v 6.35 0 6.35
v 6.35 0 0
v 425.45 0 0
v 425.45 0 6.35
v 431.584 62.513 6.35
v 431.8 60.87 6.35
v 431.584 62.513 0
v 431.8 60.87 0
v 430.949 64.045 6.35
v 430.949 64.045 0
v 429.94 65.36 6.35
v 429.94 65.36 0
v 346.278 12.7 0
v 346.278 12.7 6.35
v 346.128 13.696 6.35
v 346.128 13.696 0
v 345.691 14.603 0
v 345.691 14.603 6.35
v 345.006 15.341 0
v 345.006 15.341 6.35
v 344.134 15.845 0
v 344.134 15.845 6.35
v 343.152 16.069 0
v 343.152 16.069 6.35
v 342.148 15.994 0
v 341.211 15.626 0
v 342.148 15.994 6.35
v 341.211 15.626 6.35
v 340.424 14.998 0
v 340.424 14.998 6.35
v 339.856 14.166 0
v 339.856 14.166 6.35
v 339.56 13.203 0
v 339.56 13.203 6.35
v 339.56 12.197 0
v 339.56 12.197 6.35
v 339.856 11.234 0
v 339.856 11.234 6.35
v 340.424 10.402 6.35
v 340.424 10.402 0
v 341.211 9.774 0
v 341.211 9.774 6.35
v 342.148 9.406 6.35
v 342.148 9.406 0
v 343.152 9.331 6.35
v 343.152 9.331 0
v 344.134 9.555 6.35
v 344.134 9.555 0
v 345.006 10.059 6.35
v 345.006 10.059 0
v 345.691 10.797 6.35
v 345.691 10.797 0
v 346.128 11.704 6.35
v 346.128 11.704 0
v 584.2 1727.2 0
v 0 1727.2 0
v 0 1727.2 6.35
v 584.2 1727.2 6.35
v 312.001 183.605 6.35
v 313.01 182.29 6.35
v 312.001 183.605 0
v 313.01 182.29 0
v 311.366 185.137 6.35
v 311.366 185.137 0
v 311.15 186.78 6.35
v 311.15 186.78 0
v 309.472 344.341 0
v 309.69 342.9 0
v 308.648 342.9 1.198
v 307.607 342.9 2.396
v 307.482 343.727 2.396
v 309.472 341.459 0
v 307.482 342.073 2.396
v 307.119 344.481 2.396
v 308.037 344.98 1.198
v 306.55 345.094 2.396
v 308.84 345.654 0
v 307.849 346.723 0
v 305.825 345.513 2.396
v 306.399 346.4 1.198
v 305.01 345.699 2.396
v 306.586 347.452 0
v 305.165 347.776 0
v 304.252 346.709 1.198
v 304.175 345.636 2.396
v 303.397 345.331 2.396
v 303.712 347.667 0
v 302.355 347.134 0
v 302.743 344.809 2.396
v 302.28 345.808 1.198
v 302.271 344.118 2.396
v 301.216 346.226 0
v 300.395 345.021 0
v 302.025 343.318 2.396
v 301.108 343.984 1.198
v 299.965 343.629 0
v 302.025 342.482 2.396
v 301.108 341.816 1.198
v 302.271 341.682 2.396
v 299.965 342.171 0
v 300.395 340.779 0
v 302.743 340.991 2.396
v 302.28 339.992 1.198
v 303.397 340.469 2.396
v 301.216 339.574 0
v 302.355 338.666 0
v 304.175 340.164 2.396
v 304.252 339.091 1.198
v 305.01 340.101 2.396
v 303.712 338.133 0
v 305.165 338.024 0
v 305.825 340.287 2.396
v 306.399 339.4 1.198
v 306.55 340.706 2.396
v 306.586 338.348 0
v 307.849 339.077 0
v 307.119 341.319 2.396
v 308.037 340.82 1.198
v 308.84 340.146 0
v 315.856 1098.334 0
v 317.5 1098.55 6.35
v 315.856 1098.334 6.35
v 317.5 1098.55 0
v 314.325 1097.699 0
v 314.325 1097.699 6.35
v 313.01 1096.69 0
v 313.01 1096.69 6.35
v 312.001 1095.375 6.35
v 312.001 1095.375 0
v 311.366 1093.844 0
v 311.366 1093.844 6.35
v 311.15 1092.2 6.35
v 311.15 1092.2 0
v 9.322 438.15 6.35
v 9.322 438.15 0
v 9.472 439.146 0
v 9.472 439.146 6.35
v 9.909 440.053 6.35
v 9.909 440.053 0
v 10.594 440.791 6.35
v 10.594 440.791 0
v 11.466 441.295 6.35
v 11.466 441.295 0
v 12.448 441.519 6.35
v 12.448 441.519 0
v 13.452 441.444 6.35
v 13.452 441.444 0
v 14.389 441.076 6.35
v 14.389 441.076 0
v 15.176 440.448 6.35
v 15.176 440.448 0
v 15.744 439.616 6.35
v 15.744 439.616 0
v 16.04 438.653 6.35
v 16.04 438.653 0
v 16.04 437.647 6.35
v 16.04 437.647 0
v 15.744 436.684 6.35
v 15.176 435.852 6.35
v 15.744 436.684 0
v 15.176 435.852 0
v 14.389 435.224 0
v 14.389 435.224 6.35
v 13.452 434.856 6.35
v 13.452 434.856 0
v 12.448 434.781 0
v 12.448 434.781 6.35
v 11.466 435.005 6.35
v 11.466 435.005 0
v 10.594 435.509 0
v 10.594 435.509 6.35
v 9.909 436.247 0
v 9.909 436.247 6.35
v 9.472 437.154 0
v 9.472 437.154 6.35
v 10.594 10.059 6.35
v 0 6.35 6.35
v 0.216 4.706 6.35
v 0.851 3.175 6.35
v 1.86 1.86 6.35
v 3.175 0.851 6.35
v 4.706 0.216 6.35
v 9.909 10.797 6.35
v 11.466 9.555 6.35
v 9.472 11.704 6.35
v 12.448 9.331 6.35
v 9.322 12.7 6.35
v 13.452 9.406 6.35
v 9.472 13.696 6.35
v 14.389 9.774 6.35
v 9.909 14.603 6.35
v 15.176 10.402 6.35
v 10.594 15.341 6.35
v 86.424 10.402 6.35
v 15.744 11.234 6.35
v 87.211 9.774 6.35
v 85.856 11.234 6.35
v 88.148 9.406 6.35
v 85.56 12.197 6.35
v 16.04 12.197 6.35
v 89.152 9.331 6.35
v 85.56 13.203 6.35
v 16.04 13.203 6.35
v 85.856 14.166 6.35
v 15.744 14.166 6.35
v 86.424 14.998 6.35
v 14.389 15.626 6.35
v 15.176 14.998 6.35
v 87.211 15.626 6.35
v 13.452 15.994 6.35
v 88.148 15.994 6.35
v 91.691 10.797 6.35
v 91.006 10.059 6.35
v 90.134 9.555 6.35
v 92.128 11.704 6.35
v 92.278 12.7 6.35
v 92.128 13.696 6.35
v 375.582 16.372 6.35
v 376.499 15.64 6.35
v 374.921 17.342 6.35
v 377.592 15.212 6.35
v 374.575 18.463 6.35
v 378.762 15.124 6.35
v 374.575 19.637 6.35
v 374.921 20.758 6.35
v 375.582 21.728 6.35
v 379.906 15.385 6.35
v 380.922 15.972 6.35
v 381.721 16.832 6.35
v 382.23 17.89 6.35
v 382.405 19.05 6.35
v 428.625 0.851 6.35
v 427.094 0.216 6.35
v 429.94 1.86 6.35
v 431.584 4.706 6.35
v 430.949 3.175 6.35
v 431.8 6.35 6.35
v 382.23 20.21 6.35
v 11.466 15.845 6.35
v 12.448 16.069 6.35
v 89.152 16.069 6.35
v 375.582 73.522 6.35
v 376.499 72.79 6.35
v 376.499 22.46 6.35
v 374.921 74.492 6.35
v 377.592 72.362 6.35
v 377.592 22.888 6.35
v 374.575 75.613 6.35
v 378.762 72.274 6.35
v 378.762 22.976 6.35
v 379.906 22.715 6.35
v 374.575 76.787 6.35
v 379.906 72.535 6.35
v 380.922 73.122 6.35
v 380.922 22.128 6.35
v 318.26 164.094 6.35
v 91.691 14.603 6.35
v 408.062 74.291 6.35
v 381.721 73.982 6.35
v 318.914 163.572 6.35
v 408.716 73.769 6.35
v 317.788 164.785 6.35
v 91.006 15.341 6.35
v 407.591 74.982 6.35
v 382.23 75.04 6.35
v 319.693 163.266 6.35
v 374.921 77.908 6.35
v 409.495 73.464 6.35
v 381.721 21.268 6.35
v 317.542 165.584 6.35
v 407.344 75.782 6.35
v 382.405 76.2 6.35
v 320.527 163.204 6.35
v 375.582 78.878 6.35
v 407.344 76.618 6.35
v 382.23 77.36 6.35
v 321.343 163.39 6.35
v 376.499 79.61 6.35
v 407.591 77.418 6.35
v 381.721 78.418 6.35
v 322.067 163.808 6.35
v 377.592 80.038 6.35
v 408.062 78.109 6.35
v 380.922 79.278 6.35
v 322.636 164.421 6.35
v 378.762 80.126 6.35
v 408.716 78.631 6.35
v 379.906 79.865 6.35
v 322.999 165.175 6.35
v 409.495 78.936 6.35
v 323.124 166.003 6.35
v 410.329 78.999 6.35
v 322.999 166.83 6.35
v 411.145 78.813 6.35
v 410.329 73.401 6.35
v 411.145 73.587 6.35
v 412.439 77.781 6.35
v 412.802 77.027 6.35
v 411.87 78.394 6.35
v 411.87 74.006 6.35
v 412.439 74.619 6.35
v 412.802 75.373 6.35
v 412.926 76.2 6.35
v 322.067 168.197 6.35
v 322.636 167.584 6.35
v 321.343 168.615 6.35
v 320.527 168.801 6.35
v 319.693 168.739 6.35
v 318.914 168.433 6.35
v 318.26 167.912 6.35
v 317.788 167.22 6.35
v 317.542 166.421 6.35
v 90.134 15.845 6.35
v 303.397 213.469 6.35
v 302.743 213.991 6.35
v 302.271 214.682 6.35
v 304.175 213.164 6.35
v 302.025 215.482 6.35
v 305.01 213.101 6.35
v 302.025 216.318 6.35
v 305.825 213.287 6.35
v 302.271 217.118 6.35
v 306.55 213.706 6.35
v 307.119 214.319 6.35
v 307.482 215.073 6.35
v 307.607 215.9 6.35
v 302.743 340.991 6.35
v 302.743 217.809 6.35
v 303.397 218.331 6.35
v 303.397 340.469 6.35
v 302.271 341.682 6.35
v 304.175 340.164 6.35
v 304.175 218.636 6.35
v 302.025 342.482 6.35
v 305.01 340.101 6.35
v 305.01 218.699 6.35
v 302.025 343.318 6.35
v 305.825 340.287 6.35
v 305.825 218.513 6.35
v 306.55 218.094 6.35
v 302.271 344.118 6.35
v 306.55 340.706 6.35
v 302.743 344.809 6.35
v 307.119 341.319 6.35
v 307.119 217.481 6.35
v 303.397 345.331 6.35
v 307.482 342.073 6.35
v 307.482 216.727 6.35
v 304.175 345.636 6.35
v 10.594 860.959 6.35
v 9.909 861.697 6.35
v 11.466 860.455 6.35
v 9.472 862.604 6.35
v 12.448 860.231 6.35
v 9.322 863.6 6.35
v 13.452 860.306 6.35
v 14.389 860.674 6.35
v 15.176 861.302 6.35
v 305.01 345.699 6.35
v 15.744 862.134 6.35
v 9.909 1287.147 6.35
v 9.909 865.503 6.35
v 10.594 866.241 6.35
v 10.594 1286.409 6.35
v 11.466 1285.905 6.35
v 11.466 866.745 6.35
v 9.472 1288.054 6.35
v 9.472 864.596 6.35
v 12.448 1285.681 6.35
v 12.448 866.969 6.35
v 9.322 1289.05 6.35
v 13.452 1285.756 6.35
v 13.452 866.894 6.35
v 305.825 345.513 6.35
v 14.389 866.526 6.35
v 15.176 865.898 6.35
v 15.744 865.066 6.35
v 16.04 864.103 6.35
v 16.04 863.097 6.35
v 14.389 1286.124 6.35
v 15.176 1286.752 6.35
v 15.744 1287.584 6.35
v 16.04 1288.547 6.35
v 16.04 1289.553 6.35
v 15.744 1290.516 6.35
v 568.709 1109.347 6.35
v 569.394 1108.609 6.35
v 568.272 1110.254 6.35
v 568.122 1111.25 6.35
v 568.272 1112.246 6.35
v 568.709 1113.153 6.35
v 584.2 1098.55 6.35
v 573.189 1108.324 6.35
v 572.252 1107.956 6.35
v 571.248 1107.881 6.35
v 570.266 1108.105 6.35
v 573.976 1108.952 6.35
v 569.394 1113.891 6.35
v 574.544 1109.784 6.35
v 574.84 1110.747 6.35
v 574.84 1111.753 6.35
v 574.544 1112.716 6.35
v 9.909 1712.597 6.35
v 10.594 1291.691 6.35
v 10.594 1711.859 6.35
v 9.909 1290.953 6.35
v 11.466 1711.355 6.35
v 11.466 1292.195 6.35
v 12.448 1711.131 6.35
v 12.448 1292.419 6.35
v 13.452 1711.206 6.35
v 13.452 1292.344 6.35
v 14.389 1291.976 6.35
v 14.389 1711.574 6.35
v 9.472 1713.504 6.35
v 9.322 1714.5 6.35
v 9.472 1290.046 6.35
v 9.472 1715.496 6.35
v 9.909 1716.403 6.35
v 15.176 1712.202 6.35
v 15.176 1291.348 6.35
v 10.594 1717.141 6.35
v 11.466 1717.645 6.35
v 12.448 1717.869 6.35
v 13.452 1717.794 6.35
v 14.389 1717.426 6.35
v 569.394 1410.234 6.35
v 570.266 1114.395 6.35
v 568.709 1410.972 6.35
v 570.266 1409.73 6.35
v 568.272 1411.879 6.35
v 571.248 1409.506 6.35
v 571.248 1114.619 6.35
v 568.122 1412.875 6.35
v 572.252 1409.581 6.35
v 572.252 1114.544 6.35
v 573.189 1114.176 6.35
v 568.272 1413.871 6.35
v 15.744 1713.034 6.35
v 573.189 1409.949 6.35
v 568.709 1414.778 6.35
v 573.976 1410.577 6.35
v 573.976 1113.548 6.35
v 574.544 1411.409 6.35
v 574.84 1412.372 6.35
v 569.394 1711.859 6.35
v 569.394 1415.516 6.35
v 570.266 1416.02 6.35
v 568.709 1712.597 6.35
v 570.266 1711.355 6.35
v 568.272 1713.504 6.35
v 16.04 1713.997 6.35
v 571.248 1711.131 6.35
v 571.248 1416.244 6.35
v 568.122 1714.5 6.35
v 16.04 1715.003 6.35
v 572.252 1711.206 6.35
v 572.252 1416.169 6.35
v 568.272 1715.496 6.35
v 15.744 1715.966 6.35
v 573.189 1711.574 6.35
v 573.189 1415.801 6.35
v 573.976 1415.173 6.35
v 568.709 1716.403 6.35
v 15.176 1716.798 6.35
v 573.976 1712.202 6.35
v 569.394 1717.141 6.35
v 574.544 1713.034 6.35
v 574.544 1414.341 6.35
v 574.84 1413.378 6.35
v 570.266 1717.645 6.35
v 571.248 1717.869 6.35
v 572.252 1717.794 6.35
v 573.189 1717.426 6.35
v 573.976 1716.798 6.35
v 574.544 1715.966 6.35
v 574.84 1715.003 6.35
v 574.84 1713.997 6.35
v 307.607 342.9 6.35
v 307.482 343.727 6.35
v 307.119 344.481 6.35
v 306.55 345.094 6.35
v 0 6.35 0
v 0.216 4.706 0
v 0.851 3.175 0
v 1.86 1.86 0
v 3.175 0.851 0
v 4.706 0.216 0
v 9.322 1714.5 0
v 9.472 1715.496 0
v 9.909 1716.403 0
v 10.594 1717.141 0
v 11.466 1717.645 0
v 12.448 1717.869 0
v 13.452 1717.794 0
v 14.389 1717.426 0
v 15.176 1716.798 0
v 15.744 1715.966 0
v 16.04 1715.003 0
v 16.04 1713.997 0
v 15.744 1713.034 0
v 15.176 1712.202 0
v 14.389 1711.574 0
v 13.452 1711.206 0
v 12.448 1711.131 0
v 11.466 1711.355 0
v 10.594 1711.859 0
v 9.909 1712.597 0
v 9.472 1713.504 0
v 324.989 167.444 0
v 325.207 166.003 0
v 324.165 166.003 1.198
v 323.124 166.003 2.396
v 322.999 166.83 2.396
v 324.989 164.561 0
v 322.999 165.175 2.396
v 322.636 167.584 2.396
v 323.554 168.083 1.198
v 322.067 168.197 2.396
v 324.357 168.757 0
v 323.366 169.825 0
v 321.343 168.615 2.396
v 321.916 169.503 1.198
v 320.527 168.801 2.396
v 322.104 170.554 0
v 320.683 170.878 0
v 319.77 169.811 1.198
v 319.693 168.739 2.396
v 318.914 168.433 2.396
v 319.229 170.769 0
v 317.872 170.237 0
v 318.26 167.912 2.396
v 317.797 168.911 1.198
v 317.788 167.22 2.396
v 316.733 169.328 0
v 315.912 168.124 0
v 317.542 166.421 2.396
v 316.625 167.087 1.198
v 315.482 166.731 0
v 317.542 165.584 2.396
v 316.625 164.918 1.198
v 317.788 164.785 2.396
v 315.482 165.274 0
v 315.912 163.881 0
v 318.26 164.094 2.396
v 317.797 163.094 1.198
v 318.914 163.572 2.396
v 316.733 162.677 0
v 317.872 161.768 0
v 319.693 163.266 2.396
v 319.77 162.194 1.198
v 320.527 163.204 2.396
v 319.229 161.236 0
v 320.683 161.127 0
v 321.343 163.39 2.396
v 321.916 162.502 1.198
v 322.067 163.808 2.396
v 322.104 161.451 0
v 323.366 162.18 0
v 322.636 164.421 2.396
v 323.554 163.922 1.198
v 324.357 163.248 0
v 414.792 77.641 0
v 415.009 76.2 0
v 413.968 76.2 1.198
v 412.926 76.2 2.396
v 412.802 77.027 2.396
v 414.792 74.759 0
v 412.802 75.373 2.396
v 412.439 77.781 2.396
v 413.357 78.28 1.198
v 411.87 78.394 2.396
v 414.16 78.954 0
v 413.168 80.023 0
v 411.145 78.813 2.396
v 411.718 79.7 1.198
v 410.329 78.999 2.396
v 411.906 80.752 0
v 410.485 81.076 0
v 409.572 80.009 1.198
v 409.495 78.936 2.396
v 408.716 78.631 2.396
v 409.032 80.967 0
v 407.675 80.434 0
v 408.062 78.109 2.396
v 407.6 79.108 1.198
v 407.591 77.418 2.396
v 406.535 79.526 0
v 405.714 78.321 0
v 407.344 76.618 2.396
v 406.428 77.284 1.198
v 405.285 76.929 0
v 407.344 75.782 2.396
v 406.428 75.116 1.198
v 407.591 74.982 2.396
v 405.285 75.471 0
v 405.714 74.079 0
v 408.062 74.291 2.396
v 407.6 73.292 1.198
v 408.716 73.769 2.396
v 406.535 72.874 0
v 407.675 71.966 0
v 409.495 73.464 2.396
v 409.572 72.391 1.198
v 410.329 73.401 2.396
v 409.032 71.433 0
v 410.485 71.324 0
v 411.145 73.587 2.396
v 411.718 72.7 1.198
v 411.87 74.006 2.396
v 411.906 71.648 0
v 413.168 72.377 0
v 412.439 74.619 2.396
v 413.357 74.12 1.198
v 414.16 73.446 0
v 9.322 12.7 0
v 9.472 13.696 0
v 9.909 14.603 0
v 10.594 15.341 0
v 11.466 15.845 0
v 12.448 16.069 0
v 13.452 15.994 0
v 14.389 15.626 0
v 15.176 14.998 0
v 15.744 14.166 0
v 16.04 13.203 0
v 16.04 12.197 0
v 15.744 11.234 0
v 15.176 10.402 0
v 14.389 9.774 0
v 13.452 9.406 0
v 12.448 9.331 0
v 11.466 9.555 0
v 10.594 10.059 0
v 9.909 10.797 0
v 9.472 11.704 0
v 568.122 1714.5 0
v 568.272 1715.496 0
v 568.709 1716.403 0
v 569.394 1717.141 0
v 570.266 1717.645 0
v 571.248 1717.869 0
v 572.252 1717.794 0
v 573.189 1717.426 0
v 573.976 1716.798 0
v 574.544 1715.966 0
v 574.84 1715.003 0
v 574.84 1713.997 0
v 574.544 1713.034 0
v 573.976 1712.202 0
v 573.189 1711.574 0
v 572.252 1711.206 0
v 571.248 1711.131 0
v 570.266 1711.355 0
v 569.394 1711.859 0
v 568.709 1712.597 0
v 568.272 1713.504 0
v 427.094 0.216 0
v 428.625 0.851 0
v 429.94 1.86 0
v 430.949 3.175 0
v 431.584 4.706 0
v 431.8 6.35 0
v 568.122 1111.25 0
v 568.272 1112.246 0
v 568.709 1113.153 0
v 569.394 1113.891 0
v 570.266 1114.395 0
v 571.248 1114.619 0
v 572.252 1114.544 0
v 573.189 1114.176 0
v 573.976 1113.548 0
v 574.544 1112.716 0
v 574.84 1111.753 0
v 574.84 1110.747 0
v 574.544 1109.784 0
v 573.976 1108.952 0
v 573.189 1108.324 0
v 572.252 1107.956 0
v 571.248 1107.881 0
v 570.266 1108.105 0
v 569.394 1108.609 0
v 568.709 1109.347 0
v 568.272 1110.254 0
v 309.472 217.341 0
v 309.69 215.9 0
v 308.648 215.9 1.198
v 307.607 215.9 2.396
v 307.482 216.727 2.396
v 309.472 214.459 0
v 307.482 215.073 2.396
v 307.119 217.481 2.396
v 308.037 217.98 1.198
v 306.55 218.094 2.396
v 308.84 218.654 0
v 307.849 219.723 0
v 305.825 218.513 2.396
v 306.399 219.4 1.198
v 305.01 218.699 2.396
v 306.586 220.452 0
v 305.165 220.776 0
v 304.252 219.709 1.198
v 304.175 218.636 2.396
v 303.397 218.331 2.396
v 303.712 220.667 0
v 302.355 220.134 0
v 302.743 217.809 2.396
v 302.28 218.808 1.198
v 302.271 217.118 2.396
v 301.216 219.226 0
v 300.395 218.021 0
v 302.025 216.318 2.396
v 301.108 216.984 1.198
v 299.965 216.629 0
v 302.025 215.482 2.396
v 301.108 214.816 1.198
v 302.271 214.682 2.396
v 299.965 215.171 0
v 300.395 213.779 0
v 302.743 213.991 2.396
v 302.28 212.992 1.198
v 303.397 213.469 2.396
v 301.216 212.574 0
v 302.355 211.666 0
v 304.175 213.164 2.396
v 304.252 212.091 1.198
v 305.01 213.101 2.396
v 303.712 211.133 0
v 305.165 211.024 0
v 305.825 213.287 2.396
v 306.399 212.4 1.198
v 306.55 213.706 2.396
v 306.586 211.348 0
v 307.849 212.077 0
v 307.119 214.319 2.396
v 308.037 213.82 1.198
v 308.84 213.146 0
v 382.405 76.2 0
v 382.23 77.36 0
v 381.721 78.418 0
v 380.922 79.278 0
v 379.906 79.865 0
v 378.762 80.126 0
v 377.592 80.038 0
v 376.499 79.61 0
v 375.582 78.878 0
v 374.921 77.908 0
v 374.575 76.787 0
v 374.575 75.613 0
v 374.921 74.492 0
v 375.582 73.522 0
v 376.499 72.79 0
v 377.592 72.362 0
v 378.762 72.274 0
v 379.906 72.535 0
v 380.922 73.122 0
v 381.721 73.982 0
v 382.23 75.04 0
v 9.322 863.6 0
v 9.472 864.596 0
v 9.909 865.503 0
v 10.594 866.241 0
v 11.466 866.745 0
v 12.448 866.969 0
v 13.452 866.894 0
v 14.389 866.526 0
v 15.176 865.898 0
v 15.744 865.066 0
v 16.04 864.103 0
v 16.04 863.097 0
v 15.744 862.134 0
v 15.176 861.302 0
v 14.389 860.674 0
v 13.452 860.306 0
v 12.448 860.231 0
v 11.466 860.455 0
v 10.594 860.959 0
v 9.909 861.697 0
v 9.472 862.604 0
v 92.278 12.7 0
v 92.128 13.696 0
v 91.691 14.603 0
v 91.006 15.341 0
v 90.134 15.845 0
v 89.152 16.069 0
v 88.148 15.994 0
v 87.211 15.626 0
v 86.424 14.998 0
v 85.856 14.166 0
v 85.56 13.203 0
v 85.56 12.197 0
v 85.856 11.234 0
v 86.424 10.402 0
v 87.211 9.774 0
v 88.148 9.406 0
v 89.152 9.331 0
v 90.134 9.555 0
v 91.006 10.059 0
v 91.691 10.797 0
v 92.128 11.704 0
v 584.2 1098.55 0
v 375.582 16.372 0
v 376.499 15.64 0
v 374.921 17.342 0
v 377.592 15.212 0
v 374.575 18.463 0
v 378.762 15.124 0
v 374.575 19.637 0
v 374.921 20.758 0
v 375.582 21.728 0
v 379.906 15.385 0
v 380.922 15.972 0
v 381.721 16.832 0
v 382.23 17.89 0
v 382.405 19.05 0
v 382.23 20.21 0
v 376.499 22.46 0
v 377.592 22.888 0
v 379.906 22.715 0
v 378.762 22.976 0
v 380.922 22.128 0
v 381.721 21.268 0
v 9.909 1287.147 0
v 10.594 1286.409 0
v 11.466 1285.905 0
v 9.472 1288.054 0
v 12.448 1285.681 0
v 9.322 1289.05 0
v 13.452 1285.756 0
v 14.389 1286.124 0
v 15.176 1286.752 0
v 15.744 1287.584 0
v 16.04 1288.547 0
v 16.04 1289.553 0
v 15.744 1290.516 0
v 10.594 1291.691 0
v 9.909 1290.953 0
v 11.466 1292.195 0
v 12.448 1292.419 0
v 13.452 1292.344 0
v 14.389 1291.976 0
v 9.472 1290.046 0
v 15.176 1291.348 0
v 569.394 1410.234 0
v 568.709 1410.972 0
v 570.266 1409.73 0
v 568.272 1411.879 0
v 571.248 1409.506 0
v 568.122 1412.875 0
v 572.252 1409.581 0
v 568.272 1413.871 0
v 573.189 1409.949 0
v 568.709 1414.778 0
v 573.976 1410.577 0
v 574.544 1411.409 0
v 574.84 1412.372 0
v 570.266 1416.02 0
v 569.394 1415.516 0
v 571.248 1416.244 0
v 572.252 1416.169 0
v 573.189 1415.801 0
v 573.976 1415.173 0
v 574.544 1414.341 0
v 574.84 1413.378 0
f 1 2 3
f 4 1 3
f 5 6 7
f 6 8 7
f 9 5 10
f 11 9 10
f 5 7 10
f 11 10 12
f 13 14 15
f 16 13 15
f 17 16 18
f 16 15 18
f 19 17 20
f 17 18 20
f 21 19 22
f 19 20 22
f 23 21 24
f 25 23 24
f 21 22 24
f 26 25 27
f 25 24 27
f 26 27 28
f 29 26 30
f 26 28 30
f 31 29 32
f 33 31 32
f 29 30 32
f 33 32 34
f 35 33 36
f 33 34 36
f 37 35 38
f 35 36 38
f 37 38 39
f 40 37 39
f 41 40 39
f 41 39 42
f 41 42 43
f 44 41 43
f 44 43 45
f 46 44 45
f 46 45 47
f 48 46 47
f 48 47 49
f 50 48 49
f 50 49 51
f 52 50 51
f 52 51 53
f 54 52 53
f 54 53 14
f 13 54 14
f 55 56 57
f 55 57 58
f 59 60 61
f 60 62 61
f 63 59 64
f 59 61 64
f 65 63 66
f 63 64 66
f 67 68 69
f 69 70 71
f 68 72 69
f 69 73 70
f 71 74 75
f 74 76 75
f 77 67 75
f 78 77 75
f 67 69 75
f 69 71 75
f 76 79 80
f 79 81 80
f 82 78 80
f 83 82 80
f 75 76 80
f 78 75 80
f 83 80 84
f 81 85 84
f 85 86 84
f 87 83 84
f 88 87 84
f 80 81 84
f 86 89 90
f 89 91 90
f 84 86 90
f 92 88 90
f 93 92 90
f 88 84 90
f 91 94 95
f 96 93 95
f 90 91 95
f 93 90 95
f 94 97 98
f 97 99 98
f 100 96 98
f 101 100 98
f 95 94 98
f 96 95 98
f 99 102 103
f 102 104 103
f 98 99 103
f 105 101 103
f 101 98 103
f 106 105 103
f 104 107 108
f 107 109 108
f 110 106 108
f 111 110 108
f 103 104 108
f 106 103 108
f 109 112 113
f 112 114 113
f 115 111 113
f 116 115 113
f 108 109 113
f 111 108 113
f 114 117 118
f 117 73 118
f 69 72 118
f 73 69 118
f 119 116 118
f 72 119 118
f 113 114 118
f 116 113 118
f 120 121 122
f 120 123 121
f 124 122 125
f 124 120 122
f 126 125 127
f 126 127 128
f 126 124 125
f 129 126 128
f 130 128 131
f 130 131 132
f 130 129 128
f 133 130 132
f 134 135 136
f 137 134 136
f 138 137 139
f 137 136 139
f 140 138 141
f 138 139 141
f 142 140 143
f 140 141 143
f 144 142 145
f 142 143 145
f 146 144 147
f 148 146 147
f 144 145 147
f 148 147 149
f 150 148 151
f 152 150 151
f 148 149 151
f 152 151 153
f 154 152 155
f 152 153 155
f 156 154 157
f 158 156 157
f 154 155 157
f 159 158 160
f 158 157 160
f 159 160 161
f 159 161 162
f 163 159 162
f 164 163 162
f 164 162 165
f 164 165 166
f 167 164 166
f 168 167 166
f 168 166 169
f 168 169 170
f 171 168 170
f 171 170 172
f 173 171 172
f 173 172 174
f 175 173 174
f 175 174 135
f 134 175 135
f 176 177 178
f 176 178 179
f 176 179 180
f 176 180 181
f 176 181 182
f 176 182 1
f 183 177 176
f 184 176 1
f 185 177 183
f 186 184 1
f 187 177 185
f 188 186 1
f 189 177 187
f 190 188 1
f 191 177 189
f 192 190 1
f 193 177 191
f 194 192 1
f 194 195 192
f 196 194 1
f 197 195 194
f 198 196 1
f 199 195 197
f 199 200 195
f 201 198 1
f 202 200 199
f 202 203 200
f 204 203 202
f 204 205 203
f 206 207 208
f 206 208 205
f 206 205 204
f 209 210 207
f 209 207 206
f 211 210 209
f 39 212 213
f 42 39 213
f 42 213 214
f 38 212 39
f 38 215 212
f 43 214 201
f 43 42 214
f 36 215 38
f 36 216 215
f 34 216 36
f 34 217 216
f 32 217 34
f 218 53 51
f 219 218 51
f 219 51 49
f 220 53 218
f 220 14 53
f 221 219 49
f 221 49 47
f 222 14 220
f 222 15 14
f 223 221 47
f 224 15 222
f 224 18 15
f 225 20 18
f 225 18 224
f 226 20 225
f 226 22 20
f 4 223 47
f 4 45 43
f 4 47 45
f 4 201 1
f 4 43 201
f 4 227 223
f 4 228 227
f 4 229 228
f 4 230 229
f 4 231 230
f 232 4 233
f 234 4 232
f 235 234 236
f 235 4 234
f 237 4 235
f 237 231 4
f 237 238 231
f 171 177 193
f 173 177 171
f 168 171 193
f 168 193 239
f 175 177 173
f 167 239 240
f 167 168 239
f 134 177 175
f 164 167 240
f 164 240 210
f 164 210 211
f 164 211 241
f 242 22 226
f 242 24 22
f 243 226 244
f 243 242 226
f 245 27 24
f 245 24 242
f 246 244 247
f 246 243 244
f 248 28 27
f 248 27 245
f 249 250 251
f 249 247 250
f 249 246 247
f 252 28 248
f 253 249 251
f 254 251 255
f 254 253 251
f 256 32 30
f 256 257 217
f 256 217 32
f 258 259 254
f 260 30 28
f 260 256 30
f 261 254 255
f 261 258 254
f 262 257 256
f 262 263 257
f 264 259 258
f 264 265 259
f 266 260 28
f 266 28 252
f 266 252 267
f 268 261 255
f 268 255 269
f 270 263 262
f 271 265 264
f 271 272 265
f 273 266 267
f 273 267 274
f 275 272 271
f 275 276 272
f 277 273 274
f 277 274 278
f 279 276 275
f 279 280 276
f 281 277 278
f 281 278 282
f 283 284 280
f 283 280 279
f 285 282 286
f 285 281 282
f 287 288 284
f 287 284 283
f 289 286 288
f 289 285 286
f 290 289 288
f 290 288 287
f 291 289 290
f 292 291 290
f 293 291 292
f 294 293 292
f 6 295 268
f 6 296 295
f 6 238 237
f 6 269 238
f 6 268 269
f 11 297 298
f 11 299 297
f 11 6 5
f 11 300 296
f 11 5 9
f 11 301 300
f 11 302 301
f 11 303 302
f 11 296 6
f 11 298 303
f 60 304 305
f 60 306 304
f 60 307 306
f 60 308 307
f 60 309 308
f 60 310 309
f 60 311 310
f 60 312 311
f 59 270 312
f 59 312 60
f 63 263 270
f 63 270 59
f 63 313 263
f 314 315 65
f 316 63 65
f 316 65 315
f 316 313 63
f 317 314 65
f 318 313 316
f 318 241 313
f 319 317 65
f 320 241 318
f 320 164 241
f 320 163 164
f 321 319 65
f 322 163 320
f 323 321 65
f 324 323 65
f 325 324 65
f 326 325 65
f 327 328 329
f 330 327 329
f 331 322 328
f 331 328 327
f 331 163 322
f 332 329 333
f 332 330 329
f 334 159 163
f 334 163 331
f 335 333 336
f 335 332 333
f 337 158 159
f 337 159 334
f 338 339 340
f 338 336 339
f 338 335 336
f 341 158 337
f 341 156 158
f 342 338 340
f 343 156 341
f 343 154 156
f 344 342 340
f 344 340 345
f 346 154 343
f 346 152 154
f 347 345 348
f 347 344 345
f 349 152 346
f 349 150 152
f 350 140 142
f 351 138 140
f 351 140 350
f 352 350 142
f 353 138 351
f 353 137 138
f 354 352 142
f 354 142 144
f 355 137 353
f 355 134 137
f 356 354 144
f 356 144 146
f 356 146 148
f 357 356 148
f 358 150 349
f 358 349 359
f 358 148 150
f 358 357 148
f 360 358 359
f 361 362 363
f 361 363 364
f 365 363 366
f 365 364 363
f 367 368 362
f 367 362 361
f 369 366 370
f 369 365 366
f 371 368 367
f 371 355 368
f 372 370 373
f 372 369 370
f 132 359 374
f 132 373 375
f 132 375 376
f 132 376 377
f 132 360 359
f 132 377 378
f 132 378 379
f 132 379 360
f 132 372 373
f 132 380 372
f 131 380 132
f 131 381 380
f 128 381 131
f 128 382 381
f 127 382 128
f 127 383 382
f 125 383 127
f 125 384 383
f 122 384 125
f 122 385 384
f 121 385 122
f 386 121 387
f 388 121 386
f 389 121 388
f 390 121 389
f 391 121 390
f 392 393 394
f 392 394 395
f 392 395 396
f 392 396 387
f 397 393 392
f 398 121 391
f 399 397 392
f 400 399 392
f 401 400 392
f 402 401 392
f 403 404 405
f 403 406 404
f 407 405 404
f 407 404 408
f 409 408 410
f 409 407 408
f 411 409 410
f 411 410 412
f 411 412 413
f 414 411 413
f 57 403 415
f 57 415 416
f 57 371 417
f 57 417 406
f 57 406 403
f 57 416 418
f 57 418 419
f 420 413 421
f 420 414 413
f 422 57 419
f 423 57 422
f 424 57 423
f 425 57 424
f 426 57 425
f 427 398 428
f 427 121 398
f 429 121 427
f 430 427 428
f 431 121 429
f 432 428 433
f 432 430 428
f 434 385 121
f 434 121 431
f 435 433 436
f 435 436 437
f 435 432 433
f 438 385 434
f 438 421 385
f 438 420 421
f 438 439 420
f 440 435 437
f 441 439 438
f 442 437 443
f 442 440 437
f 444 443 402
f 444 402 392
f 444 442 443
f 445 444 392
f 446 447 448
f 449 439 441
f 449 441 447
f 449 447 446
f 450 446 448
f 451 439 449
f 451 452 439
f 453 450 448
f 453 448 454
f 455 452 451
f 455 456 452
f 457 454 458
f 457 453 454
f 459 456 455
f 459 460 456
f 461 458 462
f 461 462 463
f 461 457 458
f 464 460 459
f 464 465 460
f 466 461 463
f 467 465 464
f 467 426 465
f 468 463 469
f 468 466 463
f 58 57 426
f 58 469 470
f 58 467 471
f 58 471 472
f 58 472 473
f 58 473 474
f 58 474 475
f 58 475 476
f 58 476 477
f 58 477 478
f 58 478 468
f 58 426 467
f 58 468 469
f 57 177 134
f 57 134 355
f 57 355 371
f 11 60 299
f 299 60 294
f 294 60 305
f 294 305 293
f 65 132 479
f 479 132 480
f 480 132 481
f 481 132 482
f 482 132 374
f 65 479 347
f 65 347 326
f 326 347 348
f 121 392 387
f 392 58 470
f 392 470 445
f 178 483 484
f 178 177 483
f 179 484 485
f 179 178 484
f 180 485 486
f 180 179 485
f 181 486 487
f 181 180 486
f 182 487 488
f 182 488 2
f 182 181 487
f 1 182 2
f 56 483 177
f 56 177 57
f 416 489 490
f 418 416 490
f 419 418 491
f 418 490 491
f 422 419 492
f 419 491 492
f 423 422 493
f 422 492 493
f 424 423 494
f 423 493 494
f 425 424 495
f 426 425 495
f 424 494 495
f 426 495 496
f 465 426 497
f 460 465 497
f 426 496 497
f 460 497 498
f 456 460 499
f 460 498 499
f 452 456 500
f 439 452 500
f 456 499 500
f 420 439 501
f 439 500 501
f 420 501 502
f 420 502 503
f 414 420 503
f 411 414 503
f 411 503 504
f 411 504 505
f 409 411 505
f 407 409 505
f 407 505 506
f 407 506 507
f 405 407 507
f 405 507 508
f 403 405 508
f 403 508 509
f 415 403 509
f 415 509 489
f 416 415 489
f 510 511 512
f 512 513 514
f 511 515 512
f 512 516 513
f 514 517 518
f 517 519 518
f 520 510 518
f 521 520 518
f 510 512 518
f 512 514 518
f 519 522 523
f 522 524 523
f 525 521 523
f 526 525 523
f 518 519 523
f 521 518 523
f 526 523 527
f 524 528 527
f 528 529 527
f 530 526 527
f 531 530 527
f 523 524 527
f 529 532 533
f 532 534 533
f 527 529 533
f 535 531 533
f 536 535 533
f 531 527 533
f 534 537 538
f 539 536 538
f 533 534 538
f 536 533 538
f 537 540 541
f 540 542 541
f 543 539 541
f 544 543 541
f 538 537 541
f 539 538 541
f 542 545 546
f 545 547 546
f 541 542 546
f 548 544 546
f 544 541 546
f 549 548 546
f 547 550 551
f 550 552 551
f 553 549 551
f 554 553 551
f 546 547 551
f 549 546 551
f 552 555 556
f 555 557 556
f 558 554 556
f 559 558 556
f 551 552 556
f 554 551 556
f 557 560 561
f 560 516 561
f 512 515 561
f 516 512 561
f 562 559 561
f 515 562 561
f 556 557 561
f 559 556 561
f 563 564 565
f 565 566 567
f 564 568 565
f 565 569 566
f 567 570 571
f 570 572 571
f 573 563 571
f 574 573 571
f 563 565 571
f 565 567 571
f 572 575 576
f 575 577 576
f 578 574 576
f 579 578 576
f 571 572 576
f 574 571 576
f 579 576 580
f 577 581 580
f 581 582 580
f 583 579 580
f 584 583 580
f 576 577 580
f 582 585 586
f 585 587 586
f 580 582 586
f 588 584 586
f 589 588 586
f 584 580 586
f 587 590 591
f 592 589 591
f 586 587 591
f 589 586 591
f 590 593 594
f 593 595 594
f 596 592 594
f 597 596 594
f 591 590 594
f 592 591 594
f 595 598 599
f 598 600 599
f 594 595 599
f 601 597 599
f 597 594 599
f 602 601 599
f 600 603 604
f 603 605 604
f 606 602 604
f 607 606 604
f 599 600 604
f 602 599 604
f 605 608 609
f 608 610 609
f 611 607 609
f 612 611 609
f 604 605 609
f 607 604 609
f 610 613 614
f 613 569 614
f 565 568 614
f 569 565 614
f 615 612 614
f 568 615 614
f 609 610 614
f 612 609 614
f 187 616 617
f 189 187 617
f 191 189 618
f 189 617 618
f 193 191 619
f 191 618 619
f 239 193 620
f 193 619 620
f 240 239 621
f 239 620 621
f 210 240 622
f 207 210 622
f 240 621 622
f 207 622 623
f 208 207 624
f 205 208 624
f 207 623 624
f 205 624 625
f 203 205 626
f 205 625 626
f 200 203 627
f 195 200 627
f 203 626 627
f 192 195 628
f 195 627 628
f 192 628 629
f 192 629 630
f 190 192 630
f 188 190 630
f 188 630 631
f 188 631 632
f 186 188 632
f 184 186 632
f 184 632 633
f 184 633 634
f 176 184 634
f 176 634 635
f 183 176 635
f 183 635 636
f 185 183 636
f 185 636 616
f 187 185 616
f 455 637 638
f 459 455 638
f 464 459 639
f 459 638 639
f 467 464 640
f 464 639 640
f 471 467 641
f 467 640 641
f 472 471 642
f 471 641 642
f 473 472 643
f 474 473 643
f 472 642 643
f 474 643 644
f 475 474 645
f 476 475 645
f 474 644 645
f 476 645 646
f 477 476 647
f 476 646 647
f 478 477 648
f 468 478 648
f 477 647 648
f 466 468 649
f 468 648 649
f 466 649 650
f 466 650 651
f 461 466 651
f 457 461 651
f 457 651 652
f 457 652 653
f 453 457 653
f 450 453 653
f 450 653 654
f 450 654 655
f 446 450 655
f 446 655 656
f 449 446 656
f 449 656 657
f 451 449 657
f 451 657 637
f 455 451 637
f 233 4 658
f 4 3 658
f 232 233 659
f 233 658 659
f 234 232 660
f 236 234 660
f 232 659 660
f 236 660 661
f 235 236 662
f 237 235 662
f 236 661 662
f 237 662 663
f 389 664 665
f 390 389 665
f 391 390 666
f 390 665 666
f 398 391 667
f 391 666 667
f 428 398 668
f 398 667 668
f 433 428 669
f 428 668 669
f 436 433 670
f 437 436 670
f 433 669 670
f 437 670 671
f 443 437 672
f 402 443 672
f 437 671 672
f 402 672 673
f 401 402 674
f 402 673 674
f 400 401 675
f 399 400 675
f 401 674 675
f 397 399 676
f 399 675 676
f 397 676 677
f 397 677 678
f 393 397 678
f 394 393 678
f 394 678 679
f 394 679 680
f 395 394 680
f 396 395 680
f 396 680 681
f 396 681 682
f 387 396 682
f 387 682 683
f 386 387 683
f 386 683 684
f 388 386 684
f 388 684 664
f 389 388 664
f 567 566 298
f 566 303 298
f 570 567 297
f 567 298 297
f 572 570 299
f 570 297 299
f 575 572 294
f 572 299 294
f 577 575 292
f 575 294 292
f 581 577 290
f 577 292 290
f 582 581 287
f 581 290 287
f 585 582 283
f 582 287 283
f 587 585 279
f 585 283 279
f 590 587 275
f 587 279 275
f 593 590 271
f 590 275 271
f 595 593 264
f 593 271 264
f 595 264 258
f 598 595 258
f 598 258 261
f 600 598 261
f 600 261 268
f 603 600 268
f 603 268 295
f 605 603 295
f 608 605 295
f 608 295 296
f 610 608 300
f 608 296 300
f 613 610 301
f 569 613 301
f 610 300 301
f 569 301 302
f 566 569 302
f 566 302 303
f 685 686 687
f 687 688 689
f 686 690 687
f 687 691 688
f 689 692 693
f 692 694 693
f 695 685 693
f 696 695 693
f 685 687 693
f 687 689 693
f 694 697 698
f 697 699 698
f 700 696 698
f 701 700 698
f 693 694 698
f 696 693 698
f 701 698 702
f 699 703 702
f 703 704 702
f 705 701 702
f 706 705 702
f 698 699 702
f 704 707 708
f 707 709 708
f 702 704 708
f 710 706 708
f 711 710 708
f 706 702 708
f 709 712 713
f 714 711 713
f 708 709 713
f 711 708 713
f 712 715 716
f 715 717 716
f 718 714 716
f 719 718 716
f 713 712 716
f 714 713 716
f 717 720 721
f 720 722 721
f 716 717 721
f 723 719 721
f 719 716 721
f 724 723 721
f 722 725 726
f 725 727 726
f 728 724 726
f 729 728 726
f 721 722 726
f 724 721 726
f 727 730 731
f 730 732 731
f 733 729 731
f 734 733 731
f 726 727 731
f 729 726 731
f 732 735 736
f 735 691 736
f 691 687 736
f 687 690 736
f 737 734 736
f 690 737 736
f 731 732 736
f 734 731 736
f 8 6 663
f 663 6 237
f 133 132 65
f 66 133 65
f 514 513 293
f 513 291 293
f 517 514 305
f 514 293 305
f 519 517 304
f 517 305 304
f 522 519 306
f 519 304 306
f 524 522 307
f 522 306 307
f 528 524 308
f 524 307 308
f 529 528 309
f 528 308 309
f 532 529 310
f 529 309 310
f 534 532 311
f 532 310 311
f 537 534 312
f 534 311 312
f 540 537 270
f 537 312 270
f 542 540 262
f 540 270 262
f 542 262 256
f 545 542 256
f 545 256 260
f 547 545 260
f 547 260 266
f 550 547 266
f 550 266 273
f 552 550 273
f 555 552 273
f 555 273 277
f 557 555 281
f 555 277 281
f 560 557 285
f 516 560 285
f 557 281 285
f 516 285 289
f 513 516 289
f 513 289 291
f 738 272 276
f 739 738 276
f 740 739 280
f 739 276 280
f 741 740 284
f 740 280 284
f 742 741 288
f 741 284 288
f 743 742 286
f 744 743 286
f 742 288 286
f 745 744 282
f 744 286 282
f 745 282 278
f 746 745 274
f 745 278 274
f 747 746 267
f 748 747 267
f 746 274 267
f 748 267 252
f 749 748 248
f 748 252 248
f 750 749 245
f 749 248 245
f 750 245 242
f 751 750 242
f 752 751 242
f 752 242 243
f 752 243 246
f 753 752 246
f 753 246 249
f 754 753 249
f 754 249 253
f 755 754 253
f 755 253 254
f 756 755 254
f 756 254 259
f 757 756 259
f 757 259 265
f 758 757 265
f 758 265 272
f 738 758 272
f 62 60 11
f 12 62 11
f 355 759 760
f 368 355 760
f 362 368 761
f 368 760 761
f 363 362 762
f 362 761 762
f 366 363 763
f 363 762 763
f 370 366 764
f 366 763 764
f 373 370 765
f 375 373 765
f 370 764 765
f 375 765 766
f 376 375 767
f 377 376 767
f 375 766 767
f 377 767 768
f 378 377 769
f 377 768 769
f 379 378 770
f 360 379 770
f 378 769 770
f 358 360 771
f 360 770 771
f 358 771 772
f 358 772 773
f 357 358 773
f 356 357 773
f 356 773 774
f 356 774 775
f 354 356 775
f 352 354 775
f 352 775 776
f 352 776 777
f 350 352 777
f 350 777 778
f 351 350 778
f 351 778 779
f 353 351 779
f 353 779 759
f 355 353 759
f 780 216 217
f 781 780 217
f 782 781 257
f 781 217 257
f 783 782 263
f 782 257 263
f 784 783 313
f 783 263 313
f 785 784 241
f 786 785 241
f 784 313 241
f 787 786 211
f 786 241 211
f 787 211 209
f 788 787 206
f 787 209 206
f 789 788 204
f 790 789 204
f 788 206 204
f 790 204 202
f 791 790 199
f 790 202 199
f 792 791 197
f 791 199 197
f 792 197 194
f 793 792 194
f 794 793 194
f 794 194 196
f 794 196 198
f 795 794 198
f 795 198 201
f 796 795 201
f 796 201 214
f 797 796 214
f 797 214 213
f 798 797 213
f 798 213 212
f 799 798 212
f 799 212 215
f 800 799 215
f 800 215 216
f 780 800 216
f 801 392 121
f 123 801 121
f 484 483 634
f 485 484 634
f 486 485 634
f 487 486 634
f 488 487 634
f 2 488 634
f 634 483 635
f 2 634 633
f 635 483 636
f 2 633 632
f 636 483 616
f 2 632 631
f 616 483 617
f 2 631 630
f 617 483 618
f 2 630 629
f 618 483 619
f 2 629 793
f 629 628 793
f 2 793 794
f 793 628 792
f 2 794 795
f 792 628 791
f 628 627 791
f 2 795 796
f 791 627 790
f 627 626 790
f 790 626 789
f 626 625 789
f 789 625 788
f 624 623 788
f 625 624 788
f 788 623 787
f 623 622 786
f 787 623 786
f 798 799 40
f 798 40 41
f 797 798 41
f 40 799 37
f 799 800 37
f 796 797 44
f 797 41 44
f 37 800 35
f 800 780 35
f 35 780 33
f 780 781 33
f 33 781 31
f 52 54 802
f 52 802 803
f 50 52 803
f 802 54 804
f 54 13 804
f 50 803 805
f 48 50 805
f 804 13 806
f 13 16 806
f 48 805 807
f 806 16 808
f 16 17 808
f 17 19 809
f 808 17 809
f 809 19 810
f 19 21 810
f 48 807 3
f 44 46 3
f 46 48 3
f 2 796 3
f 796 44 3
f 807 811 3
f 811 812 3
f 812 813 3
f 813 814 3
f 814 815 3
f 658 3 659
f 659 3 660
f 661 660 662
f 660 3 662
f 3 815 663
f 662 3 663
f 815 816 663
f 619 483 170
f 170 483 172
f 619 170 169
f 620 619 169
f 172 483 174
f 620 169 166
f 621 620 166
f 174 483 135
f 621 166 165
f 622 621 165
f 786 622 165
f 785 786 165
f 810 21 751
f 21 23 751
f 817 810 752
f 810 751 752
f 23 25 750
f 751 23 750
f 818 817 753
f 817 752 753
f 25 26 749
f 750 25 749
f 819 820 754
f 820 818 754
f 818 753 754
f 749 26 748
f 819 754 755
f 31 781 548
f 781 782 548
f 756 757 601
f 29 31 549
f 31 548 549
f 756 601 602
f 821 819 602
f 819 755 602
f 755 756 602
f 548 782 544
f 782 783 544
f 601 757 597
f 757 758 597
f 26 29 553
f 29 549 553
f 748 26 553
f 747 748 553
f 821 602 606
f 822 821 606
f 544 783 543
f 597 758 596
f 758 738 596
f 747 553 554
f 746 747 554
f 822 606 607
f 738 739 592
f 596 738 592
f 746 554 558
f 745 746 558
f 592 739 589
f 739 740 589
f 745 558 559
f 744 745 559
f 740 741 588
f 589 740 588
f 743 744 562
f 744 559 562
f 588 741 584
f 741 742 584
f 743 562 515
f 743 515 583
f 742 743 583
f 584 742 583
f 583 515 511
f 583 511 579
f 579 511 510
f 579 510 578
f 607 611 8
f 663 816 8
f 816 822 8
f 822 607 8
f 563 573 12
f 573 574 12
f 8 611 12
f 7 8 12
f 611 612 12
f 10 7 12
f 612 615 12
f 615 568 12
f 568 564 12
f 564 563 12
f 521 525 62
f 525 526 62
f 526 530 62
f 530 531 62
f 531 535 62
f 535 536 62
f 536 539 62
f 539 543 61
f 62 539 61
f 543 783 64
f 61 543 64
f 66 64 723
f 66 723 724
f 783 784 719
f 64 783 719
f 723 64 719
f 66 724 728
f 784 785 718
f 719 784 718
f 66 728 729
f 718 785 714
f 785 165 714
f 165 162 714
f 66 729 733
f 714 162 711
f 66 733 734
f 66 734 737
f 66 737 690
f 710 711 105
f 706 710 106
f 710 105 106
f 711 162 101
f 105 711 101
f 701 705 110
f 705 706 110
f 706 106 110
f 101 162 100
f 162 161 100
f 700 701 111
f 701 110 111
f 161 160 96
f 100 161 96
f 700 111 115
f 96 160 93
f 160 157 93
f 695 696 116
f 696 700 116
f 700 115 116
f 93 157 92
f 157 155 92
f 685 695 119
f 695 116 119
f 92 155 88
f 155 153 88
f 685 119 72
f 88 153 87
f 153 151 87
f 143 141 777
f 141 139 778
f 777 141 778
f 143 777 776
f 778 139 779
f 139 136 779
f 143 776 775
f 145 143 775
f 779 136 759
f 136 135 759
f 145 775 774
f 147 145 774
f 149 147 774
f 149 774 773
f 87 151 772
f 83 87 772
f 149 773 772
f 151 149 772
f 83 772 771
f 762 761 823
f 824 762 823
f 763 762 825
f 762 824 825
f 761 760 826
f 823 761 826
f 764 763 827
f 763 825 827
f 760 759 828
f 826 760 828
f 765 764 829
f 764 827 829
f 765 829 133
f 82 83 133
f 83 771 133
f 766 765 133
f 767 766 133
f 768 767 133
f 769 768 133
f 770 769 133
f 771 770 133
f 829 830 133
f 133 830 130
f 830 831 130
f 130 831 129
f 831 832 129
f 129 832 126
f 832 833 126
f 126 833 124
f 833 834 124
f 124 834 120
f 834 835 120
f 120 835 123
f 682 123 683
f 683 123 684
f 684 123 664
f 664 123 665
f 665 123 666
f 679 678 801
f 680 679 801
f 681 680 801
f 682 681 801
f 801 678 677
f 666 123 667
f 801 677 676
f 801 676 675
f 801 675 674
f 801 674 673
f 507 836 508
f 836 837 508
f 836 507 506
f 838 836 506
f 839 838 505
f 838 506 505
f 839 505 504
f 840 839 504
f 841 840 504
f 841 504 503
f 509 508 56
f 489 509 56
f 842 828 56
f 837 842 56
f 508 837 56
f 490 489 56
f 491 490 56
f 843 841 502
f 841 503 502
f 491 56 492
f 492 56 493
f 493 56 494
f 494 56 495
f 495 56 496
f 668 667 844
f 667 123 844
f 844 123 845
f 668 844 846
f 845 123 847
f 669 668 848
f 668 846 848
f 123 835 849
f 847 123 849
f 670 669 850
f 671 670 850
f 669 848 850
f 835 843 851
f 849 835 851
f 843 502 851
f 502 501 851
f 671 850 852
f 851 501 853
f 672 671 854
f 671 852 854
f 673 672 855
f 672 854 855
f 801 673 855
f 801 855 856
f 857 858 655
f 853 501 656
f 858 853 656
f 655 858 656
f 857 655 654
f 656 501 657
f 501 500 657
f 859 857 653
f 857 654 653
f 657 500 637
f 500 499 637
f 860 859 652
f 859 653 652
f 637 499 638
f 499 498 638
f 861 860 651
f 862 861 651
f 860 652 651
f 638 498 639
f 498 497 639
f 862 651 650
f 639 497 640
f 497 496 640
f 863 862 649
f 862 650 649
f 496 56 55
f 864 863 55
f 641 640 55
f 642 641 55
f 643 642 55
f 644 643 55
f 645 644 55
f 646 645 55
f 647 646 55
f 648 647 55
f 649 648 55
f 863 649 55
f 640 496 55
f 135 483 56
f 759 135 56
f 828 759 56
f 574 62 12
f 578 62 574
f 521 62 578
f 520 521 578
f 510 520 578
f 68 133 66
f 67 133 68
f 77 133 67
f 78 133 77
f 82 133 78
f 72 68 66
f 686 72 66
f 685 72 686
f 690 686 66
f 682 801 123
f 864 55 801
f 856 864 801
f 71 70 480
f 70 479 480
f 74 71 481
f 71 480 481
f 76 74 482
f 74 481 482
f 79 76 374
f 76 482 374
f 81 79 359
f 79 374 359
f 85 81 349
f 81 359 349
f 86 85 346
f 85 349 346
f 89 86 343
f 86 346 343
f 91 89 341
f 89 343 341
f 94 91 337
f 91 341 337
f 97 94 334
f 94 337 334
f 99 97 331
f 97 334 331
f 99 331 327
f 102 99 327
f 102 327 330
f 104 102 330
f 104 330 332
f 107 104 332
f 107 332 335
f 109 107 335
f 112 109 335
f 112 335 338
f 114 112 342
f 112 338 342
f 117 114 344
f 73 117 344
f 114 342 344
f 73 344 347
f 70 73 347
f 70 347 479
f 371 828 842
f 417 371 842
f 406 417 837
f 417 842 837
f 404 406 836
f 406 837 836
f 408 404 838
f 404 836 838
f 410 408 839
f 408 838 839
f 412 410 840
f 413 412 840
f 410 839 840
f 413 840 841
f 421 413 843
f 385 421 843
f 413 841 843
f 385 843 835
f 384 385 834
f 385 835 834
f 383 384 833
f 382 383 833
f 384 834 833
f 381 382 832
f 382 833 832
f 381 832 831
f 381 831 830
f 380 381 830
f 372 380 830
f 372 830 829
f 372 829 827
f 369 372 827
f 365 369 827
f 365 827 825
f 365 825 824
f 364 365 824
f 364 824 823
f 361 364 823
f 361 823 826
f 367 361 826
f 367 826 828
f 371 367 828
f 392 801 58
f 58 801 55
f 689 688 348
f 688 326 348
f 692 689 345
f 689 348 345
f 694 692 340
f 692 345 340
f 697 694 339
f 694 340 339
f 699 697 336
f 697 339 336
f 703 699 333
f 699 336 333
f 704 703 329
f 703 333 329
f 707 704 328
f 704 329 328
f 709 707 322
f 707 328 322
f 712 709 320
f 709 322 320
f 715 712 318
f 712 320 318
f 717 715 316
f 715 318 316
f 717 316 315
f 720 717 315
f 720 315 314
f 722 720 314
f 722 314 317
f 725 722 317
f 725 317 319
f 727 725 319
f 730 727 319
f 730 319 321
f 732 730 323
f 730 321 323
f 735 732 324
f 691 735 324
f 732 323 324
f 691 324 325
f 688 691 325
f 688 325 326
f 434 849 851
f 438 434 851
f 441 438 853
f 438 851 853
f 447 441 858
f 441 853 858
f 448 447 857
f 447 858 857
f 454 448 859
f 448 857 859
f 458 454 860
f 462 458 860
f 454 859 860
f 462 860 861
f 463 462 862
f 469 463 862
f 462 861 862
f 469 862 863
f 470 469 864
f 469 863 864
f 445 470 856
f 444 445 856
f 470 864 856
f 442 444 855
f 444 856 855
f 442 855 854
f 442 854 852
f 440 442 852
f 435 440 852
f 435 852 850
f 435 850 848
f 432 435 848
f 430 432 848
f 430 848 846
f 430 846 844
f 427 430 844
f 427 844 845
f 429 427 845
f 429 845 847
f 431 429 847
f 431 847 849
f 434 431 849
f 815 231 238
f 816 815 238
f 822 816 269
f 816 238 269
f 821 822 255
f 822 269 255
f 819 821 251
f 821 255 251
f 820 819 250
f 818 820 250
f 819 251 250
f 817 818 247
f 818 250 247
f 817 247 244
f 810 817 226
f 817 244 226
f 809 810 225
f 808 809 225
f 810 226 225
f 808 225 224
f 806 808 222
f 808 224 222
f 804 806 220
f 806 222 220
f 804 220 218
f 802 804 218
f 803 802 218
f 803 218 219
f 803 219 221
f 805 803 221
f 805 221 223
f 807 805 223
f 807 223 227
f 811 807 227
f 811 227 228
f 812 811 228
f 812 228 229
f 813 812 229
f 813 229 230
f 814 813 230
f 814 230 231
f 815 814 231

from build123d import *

# Parameters (mm, degrees)
SKETCH2_W                                       = 584.2
SKETCH2_H                                       = 1727.2
BOSS_EXTRUDE1_DEPTH                             = 6.35
CUT_EXTRUDE1_DEPTH                              = 1824.334802635
H_0_266_DIAMETER_HOLE1_D                        = 6.7564
FILLET1_R                                       = 6.35
SKETCH7_R                                       = 3.3782
CUT_EXTRUDE2_DEPTH                              = 12.7
CSK_FOR_10_FLAT_HEAD_MACHINE_SCREW1_D           = 5.6134
CSK_FOR_10_FLAT_HEAD_MACHINE_SCREW1_CSINK_D     = 9.779
CSK_FOR_10_FLAT_HEAD_MACHINE_SCREW1_CSINK_ANGLE = 82
SKETCH15_R                                      = 3.937
CUT_EXTRUDE3_DEPTH                              = 1824.334802635


with BuildPart() as part:
    # Sketch2 → Boss-Extrude1 (new body)
    with BuildSketch(Plane.XY):
        with Locations((292.1, 863.6)):
            Rectangle(SKETCH2_W, SKETCH2_H)
    extrude(amount=BOSS_EXTRUDE1_DEPTH)

    # Sketch3 → Cut-Extrude1 (cut, through all)
    with BuildSketch(Plane.XY.offset(6.35)):
        Polygon((584.2, 1098.55), (311.15, 1098.55), (311.15, 184.15), (431.8, 63.5), (431.8, 0), (584.2, 0), align=None)
    extrude(amount=-CUT_EXTRUDE1_DEPTH, mode=Mode.SUBTRACT)

    # H (0.266) Diameter Hole1 (through all)
    with Locations(Plane.XY.offset(6.35)):
        with Locations((12.7, 1714.5), (12.7, 1289.05), (12.7, 863.6), (12.7, 438.15), (12.7, 12.7), (571.5, 1111.25), (571.5, 1412.875), (571.5, 1714.5)):
            Hole(H_0_266_DIAMETER_HOLE1_D / 2)

    # Fillet1
    fillet1_edges = [part.edges().sort_by_distance(p)[0] for p in [
        (431.8, 0, 3.175),
        (431.8, 63.5, 3.175),
        (311.15, 184.15, 3.175),
        (311.15, 1098.55, 3.175),
        (0, 0, 3.175),
    ]]
    fillet(fillet1_edges, radius=FILLET1_R)

    # Sketch7 → Cut-Extrude2 (cut)
    with BuildSketch(Plane.XY.offset(6.35)):
        with Locations((88.9, 12.7)):
            Circle(SKETCH7_R)
        with Locations((342.9, 12.7)):
            Circle(SKETCH7_R)
    extrude(amount=-CUT_EXTRUDE2_DEPTH, mode=Mode.SUBTRACT)

    # CSK for #10 Flat Head Machine Screw1 (through all)
    with Locations(Plane(origin=(0, 0, 0), x_dir=(-1, 0, 0), z_dir=(0, 0, -1))):
        with Locations((-304.8, 342.9), (-304.8, 215.9), (-320.317182668, 166.002561211), (-410.119743879, 76.2)):
            CounterSinkHole(CSK_FOR_10_FLAT_HEAD_MACHINE_SCREW1_D / 2, CSK_FOR_10_FLAT_HEAD_MACHINE_SCREW1_CSINK_D / 2, counter_sink_angle=CSK_FOR_10_FLAT_HEAD_MACHINE_SCREW1_CSINK_ANGLE)

    # Sketch15 → Cut-Extrude3 (cut, through all)
    with BuildSketch(Plane.XY.offset(6.35)):
        with Locations((378.46762, 19.05)):
            Circle(SKETCH15_R)
        with Locations((378.46762, 76.2)):
            Circle(SKETCH15_R)
    extrude(amount=-CUT_EXTRUDE3_DEPTH, mode=Mode.SUBTRACT)


solid = part.part
